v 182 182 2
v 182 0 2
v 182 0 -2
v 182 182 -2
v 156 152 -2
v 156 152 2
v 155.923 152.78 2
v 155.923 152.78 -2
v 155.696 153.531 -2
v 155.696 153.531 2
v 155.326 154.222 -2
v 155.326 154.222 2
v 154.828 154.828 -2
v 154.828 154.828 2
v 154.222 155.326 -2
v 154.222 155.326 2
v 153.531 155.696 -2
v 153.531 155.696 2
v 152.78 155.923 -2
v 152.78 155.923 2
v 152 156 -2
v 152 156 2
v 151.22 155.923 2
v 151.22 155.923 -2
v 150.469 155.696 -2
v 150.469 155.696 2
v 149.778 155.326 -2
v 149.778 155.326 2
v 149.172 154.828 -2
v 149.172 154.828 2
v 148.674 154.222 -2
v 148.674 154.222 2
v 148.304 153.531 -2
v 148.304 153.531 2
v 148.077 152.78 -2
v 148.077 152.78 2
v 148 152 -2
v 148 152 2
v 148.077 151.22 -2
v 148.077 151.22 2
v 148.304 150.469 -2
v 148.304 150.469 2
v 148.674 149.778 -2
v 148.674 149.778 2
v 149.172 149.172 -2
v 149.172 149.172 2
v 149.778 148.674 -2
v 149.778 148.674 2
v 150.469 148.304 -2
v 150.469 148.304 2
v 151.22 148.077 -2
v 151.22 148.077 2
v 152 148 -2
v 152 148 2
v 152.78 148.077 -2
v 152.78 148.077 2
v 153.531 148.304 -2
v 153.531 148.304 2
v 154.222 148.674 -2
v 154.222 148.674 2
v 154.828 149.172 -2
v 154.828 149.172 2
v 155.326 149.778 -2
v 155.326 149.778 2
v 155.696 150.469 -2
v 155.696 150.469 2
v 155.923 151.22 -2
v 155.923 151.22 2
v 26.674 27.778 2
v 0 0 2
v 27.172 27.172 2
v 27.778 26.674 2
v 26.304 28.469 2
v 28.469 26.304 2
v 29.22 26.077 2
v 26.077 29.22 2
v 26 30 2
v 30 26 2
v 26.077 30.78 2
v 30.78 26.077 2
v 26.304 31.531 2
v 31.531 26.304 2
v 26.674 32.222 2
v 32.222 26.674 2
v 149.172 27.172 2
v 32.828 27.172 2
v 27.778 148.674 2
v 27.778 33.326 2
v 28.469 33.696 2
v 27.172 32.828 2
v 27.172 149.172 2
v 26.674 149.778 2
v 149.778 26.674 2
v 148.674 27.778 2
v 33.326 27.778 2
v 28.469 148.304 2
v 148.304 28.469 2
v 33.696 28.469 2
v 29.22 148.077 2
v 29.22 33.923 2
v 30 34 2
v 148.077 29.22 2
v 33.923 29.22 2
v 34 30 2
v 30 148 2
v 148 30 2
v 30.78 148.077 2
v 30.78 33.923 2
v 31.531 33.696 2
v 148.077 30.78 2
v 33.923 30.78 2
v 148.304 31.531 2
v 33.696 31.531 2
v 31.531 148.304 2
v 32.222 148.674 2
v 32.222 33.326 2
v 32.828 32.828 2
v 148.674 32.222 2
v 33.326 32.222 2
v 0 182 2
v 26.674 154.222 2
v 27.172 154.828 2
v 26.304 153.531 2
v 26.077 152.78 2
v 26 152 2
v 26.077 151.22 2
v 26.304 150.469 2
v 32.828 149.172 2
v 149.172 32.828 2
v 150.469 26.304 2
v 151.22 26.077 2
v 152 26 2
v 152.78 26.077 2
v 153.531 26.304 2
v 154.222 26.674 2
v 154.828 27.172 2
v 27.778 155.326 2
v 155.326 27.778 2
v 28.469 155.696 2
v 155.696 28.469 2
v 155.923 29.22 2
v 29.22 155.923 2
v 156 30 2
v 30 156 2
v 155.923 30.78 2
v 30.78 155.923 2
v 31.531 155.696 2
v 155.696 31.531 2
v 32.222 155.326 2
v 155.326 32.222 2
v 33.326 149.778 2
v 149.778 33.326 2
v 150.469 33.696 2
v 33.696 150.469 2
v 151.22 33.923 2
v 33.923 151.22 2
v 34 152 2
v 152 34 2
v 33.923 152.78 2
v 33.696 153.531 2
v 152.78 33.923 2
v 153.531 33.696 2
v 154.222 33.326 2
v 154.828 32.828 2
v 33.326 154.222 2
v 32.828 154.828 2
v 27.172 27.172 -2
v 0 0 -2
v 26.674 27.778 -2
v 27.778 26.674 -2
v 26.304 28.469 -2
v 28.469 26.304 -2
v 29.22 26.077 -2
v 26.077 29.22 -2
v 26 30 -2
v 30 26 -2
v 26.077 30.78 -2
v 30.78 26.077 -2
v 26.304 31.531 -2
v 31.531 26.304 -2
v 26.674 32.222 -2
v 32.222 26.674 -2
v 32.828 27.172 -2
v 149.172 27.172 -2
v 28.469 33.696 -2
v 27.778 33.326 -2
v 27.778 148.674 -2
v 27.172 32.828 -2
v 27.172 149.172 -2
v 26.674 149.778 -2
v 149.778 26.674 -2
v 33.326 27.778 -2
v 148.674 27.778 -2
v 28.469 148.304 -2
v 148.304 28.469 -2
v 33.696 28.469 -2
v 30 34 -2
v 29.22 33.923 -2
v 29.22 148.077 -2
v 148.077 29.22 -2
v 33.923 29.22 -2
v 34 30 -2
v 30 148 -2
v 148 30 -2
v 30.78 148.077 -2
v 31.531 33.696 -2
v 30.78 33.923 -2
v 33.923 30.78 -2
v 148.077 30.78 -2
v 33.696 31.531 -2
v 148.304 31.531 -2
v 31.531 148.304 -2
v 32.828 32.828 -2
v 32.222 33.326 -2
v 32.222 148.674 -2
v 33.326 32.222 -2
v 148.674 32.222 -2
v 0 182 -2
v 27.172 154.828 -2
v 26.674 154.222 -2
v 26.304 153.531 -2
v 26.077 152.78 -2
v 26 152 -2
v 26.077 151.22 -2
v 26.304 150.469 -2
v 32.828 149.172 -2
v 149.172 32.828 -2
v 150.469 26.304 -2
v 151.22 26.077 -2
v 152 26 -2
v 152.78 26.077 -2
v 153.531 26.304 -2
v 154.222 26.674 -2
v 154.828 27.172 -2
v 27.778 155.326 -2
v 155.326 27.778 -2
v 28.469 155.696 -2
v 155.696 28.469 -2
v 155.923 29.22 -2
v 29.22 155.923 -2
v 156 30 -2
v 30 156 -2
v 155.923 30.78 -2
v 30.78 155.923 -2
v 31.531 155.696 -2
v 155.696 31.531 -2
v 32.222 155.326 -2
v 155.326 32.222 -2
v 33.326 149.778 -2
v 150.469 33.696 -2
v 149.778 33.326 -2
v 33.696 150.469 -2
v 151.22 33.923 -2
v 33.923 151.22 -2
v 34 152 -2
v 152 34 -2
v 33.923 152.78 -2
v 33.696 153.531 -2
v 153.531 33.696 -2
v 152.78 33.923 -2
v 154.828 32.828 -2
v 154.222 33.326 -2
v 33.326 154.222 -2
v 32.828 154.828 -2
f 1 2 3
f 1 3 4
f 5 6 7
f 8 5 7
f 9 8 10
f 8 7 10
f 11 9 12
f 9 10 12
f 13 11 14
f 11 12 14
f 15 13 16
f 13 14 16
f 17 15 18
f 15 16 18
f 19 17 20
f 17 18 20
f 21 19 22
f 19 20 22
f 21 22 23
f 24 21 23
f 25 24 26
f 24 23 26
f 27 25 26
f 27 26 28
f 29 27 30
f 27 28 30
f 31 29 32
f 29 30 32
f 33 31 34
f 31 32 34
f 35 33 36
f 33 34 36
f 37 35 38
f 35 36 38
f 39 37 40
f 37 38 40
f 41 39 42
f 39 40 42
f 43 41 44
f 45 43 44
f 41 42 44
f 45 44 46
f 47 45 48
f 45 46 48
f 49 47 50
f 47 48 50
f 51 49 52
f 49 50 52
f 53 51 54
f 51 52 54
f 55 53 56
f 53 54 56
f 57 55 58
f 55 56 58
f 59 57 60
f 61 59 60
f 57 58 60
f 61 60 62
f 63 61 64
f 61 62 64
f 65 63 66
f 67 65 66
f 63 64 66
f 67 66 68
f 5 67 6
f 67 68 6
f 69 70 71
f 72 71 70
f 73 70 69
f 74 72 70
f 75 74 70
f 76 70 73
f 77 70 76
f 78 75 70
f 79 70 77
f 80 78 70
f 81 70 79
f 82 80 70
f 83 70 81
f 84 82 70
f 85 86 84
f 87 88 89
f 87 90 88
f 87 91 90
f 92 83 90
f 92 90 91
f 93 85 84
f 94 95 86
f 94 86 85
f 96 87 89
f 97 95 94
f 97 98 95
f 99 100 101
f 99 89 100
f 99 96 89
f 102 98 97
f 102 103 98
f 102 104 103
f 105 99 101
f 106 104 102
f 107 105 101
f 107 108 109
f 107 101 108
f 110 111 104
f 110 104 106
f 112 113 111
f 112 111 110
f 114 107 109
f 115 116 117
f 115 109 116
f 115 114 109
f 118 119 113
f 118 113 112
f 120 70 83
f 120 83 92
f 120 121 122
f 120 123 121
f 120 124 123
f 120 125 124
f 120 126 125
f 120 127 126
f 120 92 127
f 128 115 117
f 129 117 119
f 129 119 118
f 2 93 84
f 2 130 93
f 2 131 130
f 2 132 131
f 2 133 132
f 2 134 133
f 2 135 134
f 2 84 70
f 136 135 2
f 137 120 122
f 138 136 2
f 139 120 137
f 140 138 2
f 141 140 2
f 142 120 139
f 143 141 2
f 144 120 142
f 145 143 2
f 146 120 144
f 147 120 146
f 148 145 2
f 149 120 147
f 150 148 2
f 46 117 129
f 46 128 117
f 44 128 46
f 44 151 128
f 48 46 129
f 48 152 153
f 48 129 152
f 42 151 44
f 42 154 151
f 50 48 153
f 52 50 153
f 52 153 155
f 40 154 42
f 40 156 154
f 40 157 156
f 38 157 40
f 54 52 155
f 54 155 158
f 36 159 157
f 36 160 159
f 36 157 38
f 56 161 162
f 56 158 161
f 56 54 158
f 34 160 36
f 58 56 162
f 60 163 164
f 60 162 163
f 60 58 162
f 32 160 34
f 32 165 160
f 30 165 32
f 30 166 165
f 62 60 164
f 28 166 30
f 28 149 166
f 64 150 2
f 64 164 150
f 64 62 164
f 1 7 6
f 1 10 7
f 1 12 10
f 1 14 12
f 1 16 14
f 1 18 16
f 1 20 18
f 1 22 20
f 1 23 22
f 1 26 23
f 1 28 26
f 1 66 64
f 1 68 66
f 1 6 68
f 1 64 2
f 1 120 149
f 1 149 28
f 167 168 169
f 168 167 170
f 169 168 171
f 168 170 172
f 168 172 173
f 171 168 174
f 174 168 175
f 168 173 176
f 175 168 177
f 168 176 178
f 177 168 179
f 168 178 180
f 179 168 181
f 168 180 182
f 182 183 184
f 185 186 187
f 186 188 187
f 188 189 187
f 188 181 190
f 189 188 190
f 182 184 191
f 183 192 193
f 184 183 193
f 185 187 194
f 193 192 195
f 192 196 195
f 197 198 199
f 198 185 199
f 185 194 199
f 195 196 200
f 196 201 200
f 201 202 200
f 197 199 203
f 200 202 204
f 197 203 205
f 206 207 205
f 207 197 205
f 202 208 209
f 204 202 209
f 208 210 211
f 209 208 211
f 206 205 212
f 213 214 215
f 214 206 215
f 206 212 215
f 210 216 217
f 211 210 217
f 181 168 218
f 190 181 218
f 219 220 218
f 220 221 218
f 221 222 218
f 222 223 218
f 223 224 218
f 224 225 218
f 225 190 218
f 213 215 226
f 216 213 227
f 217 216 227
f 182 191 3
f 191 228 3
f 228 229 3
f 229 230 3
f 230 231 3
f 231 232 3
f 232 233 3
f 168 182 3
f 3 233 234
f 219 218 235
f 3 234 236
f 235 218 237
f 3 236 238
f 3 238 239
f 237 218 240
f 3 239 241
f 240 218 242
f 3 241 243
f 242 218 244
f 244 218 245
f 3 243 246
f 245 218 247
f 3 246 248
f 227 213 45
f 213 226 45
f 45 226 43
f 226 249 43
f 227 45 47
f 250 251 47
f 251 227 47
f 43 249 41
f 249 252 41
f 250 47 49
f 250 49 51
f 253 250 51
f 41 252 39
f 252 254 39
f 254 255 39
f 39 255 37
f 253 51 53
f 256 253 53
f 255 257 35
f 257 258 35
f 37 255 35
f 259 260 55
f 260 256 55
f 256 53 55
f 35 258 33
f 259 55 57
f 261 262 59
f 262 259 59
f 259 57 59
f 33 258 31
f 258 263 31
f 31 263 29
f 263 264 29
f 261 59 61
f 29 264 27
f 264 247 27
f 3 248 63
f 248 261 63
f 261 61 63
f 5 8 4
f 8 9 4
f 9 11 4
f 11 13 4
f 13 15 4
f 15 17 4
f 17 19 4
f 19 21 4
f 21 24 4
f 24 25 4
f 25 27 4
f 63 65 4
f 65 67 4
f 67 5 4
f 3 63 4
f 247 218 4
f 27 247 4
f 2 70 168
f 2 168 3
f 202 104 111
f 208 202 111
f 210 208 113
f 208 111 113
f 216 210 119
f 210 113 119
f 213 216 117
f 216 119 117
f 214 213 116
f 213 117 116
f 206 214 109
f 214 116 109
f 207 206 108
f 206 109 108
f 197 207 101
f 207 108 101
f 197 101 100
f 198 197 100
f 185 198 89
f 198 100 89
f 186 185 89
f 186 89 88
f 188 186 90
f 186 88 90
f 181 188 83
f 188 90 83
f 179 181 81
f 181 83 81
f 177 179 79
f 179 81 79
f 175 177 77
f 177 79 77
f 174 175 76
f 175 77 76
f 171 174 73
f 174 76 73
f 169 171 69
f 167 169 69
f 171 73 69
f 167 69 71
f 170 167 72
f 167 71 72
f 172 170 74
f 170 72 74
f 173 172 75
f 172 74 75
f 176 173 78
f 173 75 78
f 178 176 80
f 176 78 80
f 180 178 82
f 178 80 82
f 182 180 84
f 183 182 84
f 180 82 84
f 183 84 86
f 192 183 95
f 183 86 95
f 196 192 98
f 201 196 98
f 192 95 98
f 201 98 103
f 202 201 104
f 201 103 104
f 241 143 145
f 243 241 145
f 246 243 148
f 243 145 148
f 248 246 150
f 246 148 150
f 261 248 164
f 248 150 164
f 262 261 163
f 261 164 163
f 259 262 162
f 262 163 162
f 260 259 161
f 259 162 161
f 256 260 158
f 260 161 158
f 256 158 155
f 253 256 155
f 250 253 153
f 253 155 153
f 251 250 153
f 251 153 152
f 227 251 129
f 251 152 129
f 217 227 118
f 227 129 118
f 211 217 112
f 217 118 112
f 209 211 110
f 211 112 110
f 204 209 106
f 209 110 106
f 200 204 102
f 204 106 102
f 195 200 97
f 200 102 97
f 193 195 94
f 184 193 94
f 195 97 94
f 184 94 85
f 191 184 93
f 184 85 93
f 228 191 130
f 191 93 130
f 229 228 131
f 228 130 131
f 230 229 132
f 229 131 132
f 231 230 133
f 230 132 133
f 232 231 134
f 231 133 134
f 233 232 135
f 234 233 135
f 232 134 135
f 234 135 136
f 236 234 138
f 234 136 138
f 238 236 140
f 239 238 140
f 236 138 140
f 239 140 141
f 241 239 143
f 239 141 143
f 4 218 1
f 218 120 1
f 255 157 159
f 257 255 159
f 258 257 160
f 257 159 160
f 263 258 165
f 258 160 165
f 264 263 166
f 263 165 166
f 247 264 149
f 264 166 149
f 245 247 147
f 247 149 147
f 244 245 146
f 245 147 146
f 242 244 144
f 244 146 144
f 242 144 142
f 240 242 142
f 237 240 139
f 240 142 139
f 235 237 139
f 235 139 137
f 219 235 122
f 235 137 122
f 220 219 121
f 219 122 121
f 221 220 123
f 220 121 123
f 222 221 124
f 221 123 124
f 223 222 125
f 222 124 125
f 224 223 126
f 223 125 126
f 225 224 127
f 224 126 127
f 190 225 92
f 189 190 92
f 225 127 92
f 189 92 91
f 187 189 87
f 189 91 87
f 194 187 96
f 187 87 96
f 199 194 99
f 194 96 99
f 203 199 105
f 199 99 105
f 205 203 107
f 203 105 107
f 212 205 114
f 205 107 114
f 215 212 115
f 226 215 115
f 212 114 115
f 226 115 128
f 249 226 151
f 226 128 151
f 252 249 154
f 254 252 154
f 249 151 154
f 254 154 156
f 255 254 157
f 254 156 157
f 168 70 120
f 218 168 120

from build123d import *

# Parameters (mm, degrees)
CROQUIS1_W              = 182
CROQUIS1_H              = 182
SALIENTE_EXTRUIR1_DEPTH = 2
CROQUIS2_R              = 4
CORTAR_EXTRUIR1_DEPTH   = 4


with BuildPart() as part:
    # Croquis1 → Saliente-Extruir1 (new, symmetric)
    with BuildSketch(Plane.XY):
        with Locations((91, 91)):
            Rectangle(CROQUIS1_W, CROQUIS1_H)
    extrude(amount=SALIENTE_EXTRUIR1_DEPTH, both=True)

    # Croquis2 → Cortar-Extruir1 (cut)
    with BuildSketch(Plane.XY.offset(2)):
        with Locations((30, 152)):
            Circle(CROQUIS2_R)
        with Locations((152, 152)):
            Circle(CROQUIS2_R)
        with Locations((152, 30)):
            Circle(CROQUIS2_R)
        with Locations((30, 30)):
            Circle(CROQUIS2_R)
    extrude(amount=-CORTAR_EXTRUIR1_DEPTH, mode=Mode.SUBTRACT)


solid = part.part
